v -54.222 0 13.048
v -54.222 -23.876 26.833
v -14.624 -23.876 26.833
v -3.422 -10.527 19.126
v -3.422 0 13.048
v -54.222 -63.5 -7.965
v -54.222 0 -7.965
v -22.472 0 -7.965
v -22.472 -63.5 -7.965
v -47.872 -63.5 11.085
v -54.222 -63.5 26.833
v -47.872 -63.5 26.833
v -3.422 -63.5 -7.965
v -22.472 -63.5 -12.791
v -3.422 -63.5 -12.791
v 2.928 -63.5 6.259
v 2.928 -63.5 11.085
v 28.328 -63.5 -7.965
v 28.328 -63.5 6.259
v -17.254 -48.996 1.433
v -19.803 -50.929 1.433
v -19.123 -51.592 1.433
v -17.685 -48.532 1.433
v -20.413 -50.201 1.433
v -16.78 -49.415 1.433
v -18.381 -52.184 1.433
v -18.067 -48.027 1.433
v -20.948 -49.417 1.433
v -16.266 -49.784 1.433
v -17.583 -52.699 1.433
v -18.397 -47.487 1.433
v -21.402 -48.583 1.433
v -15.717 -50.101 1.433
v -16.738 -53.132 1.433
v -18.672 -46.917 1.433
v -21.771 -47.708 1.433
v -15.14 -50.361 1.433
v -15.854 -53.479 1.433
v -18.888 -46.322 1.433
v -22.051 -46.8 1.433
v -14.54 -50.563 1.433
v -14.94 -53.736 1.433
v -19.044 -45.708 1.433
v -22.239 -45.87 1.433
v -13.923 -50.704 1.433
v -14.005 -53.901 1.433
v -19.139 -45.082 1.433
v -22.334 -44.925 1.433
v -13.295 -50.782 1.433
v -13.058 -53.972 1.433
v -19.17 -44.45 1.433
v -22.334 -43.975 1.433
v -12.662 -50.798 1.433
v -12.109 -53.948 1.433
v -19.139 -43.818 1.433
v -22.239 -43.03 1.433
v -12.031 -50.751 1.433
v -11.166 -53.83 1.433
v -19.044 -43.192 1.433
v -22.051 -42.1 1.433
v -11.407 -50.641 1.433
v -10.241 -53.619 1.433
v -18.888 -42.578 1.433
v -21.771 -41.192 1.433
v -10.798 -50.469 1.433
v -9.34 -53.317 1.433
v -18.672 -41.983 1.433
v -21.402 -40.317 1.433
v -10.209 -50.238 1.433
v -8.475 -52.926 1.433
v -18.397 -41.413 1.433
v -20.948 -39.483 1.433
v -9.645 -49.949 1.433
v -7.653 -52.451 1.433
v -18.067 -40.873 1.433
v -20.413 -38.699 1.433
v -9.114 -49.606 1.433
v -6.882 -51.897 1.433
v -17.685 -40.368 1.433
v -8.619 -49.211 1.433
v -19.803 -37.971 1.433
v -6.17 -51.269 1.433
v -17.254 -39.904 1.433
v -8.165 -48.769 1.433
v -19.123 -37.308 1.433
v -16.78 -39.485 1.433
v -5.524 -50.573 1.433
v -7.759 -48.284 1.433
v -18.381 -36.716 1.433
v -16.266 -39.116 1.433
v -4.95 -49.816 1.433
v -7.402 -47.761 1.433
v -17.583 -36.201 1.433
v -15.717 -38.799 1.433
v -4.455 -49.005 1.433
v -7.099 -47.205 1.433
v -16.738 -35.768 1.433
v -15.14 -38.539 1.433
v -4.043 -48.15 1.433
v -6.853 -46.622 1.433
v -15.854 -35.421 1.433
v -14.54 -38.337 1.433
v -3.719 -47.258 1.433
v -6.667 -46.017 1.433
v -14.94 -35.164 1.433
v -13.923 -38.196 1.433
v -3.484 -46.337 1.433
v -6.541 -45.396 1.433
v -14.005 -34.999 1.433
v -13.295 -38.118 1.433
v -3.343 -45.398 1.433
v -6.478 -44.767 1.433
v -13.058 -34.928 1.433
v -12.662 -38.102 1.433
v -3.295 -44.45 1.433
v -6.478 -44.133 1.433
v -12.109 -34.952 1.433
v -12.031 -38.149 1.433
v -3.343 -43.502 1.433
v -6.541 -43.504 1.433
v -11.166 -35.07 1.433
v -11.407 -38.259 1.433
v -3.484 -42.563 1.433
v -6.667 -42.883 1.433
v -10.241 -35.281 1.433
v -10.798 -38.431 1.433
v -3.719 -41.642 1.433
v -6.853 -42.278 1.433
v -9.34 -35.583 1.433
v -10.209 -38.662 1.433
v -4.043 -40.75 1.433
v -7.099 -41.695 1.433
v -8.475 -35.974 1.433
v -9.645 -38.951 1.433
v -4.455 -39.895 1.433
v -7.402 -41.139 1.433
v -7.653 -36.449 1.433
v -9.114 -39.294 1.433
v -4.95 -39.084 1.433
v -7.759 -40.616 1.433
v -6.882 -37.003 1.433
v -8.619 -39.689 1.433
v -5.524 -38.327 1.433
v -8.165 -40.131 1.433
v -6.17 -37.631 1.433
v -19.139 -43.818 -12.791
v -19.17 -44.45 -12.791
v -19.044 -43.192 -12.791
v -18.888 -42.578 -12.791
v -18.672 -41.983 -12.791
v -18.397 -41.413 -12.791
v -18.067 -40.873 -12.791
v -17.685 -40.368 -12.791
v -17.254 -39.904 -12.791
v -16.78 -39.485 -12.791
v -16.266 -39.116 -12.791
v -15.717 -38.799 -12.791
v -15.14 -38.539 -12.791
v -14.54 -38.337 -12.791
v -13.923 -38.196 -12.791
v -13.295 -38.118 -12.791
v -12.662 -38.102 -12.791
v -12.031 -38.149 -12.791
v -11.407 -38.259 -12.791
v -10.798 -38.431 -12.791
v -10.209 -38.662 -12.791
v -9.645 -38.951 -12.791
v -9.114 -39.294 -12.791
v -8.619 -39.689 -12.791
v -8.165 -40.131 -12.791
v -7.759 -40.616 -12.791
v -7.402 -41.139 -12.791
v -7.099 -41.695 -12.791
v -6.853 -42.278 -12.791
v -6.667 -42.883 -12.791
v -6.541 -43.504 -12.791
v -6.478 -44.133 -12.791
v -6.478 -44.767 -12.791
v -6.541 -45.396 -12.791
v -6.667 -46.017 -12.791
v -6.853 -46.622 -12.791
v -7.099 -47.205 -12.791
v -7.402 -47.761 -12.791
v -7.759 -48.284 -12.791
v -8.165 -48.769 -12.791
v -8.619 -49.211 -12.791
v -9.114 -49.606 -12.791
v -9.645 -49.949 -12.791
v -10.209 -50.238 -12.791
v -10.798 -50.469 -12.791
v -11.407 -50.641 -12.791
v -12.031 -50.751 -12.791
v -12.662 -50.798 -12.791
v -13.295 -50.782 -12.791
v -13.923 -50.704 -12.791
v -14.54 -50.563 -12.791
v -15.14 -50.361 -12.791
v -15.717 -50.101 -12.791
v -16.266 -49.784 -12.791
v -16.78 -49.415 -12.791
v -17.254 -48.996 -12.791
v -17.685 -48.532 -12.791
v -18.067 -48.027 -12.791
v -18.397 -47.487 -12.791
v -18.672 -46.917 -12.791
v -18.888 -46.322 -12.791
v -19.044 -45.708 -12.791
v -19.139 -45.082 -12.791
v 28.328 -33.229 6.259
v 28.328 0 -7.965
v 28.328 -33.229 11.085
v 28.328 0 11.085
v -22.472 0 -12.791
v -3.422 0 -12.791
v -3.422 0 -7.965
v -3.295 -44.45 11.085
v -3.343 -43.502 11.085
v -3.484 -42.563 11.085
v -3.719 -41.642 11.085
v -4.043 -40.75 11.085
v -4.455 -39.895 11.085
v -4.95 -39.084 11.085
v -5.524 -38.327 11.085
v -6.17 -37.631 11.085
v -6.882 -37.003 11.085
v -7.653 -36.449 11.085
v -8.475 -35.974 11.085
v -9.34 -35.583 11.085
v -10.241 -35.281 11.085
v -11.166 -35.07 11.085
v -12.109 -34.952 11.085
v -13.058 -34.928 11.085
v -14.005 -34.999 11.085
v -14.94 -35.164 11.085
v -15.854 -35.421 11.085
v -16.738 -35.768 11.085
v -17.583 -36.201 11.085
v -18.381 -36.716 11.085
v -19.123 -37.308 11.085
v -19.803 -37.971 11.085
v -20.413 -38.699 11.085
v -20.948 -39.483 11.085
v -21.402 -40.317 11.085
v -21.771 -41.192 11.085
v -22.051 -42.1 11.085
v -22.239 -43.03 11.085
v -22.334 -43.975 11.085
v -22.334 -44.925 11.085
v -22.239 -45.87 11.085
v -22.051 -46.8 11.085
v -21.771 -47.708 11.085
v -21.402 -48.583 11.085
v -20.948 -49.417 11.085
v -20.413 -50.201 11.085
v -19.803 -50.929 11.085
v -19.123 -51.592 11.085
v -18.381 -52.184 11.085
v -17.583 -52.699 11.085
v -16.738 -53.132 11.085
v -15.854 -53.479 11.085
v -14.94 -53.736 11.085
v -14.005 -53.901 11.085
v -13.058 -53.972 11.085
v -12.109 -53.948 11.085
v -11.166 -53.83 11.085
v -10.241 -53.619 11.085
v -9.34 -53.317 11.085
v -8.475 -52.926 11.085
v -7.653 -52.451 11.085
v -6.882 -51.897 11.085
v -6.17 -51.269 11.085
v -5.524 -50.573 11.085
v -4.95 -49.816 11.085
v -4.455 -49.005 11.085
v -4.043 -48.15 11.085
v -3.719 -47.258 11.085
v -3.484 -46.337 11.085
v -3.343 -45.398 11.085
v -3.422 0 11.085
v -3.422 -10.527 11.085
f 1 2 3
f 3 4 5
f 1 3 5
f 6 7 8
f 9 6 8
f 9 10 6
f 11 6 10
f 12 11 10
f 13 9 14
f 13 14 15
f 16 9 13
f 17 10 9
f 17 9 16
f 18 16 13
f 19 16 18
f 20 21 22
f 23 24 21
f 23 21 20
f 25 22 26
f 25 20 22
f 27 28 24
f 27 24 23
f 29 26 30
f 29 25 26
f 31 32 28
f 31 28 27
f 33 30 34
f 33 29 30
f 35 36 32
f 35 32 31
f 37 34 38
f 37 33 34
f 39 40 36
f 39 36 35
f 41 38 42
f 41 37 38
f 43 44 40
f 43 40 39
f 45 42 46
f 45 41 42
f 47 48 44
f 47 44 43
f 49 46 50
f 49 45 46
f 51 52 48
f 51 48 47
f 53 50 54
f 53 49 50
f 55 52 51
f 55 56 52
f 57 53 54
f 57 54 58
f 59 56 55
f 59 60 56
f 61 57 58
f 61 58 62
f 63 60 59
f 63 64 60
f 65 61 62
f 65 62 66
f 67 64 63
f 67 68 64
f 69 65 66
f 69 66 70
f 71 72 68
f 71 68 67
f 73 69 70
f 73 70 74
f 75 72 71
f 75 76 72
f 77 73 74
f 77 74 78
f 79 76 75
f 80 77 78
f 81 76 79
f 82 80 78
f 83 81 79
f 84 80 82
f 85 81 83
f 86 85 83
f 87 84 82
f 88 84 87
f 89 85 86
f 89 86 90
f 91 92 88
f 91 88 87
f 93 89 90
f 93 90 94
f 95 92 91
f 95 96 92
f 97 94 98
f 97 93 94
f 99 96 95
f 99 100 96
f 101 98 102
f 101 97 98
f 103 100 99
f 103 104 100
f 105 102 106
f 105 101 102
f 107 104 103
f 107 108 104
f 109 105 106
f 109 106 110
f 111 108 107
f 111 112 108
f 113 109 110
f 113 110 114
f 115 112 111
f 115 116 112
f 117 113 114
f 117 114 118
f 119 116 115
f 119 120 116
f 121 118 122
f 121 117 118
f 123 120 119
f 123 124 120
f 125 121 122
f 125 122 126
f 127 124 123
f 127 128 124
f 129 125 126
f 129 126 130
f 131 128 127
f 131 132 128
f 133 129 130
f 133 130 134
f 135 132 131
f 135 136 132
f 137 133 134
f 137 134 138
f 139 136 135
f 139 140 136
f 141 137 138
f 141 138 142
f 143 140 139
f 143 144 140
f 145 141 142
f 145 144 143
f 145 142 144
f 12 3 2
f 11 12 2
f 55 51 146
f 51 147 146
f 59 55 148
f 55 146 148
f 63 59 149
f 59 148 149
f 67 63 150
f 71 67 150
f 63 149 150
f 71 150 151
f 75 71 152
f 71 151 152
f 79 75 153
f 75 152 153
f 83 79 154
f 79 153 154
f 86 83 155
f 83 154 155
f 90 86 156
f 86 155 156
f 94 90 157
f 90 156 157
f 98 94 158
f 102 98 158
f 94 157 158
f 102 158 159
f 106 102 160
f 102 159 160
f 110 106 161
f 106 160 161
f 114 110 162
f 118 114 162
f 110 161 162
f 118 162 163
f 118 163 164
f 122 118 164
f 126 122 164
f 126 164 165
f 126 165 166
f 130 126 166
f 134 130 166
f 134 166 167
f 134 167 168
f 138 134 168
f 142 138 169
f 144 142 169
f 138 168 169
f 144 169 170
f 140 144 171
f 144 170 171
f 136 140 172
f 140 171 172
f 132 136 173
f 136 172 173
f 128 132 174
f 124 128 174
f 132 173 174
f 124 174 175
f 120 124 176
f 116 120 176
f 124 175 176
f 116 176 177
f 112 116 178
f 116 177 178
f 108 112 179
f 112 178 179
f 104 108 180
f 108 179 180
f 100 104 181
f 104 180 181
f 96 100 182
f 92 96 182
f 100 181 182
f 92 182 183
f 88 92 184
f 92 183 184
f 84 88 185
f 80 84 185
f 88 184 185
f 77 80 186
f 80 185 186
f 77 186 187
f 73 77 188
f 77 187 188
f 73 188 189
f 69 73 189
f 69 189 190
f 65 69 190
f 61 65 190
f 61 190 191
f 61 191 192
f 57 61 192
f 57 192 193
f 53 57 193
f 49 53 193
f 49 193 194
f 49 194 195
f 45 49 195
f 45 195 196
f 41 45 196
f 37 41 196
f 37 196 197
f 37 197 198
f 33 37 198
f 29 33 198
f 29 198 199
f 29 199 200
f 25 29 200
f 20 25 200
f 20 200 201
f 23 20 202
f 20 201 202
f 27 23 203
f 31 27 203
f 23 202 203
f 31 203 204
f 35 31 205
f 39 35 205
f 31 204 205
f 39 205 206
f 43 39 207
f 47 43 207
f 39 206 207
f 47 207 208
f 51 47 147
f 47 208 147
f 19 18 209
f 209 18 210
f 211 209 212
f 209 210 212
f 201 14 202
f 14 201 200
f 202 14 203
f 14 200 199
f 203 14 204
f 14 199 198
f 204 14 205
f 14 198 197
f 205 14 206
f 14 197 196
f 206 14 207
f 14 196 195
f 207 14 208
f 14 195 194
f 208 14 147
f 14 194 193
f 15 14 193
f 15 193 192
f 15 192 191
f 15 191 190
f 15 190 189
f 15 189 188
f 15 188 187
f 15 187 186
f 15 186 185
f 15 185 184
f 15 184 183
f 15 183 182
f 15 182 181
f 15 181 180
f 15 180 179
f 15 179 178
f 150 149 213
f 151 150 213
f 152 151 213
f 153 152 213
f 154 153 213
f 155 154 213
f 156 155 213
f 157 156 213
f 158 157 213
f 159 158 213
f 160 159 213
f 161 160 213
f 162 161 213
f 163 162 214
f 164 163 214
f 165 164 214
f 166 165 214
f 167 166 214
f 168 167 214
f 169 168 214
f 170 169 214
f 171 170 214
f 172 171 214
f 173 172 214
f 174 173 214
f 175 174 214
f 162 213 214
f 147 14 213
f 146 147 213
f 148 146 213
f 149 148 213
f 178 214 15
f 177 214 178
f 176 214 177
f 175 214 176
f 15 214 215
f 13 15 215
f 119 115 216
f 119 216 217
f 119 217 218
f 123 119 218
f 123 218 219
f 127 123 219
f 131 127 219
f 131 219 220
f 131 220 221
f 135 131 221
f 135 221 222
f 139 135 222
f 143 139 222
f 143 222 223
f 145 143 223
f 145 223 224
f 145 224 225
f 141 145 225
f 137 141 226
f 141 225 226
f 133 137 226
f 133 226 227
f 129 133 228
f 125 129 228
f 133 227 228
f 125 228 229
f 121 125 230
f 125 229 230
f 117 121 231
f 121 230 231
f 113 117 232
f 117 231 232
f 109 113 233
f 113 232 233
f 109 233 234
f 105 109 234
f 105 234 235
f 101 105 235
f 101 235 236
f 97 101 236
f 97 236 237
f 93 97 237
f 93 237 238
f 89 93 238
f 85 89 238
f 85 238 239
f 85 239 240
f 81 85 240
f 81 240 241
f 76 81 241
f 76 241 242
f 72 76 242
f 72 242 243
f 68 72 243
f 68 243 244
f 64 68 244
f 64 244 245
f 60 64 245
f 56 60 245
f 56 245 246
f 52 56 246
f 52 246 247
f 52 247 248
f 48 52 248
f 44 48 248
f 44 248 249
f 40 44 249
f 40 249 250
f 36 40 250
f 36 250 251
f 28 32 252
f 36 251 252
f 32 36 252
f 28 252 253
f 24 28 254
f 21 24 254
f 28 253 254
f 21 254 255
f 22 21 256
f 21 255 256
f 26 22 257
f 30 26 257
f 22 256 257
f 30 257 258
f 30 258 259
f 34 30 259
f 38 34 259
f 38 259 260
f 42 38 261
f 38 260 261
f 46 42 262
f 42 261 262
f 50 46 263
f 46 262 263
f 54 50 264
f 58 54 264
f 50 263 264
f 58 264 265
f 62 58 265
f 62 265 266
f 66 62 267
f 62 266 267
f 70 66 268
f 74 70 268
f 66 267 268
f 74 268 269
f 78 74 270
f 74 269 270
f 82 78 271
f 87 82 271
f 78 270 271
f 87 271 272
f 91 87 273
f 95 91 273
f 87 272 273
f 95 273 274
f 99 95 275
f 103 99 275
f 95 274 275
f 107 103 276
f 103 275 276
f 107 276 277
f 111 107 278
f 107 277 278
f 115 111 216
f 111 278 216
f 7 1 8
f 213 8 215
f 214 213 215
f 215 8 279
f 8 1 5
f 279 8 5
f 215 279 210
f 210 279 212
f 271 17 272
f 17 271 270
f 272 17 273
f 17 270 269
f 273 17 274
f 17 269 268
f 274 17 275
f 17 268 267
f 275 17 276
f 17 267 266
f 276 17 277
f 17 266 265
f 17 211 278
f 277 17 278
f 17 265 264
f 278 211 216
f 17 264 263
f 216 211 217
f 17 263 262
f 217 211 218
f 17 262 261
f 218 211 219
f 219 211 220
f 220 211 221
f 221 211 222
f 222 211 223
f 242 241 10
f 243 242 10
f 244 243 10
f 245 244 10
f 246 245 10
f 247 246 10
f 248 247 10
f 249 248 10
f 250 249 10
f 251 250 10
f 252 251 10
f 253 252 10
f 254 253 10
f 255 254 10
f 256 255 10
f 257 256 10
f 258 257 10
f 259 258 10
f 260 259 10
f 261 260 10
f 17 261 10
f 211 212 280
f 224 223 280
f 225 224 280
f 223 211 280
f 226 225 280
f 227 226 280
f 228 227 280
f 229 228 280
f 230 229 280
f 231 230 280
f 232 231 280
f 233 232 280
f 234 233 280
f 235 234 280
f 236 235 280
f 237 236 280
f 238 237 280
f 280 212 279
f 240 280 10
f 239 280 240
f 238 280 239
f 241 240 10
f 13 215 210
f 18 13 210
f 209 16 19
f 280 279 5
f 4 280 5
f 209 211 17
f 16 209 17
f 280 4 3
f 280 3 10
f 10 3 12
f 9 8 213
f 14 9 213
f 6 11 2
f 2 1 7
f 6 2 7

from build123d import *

# Parameters (mm, degrees)
F1_DEPTH       = 63.5
F3_DEPTH       = 15.748
F5_DEPTH       = 4.826
F7_DEPTH       = 55.118
F9_D           = 12.7
F9_CBORE_D     = 19.05
F9_CBORE_DEPTH = 9.652


with BuildPart() as f1:
    # F0 (on Front) → F1 (new body)
    with BuildSketch(Plane.XZ):
        Polygon((-3.422344, 11.084872), (-3.422344, 26.832872), (-54.222344, 26.832872), (-54.222344, -7.965128), (-22.472344, -7.965128), (-22.472344, -12.791128), (-3.422344, -12.791128), (-3.422344, -7.965128), (28.327656, -7.965128), (28.327656, 11.084872), align=None)
    extrude(amount=F1_DEPTH)

    # F2 (on face) → F3 (cut)
    with BuildSketch(Plane.XY.offset(26.832872)):
        Polygon((-3.422344, -10.526553), (-47.872344, -63.5), (-3.422344, -63.5), align=None)
    extrude(amount=-F3_DEPTH, mode=Mode.SUBTRACT)

    # F4 (on face) → F5 (cut)
    with BuildSketch(Plane.XY.offset(11.084872)):
        Polygon((2.927656, -63.5), (28.327656, -63.5), (28.327656, -33.229459), align=None)
    extrude(amount=-F5_DEPTH, mode=Mode.SUBTRACT)

    # F6 (on face) → F7 (cut)
    with BuildSketch(Plane.YZ.offset(-3.422344)):
        Polygon((0, 13.048057), (0, 26.832872), (-23.876, 26.832872), align=None)
    extrude(amount=-F7_DEPTH, mode=Mode.SUBTRACT)

    # F9 (through all)
    with Locations(Plane.XY.offset(11.084872)):
        with Locations((-12.820344, -44.45)):
            CounterBoreHole(F9_D / 2, F9_CBORE_D / 2, F9_CBORE_DEPTH)


solid = f1.part
